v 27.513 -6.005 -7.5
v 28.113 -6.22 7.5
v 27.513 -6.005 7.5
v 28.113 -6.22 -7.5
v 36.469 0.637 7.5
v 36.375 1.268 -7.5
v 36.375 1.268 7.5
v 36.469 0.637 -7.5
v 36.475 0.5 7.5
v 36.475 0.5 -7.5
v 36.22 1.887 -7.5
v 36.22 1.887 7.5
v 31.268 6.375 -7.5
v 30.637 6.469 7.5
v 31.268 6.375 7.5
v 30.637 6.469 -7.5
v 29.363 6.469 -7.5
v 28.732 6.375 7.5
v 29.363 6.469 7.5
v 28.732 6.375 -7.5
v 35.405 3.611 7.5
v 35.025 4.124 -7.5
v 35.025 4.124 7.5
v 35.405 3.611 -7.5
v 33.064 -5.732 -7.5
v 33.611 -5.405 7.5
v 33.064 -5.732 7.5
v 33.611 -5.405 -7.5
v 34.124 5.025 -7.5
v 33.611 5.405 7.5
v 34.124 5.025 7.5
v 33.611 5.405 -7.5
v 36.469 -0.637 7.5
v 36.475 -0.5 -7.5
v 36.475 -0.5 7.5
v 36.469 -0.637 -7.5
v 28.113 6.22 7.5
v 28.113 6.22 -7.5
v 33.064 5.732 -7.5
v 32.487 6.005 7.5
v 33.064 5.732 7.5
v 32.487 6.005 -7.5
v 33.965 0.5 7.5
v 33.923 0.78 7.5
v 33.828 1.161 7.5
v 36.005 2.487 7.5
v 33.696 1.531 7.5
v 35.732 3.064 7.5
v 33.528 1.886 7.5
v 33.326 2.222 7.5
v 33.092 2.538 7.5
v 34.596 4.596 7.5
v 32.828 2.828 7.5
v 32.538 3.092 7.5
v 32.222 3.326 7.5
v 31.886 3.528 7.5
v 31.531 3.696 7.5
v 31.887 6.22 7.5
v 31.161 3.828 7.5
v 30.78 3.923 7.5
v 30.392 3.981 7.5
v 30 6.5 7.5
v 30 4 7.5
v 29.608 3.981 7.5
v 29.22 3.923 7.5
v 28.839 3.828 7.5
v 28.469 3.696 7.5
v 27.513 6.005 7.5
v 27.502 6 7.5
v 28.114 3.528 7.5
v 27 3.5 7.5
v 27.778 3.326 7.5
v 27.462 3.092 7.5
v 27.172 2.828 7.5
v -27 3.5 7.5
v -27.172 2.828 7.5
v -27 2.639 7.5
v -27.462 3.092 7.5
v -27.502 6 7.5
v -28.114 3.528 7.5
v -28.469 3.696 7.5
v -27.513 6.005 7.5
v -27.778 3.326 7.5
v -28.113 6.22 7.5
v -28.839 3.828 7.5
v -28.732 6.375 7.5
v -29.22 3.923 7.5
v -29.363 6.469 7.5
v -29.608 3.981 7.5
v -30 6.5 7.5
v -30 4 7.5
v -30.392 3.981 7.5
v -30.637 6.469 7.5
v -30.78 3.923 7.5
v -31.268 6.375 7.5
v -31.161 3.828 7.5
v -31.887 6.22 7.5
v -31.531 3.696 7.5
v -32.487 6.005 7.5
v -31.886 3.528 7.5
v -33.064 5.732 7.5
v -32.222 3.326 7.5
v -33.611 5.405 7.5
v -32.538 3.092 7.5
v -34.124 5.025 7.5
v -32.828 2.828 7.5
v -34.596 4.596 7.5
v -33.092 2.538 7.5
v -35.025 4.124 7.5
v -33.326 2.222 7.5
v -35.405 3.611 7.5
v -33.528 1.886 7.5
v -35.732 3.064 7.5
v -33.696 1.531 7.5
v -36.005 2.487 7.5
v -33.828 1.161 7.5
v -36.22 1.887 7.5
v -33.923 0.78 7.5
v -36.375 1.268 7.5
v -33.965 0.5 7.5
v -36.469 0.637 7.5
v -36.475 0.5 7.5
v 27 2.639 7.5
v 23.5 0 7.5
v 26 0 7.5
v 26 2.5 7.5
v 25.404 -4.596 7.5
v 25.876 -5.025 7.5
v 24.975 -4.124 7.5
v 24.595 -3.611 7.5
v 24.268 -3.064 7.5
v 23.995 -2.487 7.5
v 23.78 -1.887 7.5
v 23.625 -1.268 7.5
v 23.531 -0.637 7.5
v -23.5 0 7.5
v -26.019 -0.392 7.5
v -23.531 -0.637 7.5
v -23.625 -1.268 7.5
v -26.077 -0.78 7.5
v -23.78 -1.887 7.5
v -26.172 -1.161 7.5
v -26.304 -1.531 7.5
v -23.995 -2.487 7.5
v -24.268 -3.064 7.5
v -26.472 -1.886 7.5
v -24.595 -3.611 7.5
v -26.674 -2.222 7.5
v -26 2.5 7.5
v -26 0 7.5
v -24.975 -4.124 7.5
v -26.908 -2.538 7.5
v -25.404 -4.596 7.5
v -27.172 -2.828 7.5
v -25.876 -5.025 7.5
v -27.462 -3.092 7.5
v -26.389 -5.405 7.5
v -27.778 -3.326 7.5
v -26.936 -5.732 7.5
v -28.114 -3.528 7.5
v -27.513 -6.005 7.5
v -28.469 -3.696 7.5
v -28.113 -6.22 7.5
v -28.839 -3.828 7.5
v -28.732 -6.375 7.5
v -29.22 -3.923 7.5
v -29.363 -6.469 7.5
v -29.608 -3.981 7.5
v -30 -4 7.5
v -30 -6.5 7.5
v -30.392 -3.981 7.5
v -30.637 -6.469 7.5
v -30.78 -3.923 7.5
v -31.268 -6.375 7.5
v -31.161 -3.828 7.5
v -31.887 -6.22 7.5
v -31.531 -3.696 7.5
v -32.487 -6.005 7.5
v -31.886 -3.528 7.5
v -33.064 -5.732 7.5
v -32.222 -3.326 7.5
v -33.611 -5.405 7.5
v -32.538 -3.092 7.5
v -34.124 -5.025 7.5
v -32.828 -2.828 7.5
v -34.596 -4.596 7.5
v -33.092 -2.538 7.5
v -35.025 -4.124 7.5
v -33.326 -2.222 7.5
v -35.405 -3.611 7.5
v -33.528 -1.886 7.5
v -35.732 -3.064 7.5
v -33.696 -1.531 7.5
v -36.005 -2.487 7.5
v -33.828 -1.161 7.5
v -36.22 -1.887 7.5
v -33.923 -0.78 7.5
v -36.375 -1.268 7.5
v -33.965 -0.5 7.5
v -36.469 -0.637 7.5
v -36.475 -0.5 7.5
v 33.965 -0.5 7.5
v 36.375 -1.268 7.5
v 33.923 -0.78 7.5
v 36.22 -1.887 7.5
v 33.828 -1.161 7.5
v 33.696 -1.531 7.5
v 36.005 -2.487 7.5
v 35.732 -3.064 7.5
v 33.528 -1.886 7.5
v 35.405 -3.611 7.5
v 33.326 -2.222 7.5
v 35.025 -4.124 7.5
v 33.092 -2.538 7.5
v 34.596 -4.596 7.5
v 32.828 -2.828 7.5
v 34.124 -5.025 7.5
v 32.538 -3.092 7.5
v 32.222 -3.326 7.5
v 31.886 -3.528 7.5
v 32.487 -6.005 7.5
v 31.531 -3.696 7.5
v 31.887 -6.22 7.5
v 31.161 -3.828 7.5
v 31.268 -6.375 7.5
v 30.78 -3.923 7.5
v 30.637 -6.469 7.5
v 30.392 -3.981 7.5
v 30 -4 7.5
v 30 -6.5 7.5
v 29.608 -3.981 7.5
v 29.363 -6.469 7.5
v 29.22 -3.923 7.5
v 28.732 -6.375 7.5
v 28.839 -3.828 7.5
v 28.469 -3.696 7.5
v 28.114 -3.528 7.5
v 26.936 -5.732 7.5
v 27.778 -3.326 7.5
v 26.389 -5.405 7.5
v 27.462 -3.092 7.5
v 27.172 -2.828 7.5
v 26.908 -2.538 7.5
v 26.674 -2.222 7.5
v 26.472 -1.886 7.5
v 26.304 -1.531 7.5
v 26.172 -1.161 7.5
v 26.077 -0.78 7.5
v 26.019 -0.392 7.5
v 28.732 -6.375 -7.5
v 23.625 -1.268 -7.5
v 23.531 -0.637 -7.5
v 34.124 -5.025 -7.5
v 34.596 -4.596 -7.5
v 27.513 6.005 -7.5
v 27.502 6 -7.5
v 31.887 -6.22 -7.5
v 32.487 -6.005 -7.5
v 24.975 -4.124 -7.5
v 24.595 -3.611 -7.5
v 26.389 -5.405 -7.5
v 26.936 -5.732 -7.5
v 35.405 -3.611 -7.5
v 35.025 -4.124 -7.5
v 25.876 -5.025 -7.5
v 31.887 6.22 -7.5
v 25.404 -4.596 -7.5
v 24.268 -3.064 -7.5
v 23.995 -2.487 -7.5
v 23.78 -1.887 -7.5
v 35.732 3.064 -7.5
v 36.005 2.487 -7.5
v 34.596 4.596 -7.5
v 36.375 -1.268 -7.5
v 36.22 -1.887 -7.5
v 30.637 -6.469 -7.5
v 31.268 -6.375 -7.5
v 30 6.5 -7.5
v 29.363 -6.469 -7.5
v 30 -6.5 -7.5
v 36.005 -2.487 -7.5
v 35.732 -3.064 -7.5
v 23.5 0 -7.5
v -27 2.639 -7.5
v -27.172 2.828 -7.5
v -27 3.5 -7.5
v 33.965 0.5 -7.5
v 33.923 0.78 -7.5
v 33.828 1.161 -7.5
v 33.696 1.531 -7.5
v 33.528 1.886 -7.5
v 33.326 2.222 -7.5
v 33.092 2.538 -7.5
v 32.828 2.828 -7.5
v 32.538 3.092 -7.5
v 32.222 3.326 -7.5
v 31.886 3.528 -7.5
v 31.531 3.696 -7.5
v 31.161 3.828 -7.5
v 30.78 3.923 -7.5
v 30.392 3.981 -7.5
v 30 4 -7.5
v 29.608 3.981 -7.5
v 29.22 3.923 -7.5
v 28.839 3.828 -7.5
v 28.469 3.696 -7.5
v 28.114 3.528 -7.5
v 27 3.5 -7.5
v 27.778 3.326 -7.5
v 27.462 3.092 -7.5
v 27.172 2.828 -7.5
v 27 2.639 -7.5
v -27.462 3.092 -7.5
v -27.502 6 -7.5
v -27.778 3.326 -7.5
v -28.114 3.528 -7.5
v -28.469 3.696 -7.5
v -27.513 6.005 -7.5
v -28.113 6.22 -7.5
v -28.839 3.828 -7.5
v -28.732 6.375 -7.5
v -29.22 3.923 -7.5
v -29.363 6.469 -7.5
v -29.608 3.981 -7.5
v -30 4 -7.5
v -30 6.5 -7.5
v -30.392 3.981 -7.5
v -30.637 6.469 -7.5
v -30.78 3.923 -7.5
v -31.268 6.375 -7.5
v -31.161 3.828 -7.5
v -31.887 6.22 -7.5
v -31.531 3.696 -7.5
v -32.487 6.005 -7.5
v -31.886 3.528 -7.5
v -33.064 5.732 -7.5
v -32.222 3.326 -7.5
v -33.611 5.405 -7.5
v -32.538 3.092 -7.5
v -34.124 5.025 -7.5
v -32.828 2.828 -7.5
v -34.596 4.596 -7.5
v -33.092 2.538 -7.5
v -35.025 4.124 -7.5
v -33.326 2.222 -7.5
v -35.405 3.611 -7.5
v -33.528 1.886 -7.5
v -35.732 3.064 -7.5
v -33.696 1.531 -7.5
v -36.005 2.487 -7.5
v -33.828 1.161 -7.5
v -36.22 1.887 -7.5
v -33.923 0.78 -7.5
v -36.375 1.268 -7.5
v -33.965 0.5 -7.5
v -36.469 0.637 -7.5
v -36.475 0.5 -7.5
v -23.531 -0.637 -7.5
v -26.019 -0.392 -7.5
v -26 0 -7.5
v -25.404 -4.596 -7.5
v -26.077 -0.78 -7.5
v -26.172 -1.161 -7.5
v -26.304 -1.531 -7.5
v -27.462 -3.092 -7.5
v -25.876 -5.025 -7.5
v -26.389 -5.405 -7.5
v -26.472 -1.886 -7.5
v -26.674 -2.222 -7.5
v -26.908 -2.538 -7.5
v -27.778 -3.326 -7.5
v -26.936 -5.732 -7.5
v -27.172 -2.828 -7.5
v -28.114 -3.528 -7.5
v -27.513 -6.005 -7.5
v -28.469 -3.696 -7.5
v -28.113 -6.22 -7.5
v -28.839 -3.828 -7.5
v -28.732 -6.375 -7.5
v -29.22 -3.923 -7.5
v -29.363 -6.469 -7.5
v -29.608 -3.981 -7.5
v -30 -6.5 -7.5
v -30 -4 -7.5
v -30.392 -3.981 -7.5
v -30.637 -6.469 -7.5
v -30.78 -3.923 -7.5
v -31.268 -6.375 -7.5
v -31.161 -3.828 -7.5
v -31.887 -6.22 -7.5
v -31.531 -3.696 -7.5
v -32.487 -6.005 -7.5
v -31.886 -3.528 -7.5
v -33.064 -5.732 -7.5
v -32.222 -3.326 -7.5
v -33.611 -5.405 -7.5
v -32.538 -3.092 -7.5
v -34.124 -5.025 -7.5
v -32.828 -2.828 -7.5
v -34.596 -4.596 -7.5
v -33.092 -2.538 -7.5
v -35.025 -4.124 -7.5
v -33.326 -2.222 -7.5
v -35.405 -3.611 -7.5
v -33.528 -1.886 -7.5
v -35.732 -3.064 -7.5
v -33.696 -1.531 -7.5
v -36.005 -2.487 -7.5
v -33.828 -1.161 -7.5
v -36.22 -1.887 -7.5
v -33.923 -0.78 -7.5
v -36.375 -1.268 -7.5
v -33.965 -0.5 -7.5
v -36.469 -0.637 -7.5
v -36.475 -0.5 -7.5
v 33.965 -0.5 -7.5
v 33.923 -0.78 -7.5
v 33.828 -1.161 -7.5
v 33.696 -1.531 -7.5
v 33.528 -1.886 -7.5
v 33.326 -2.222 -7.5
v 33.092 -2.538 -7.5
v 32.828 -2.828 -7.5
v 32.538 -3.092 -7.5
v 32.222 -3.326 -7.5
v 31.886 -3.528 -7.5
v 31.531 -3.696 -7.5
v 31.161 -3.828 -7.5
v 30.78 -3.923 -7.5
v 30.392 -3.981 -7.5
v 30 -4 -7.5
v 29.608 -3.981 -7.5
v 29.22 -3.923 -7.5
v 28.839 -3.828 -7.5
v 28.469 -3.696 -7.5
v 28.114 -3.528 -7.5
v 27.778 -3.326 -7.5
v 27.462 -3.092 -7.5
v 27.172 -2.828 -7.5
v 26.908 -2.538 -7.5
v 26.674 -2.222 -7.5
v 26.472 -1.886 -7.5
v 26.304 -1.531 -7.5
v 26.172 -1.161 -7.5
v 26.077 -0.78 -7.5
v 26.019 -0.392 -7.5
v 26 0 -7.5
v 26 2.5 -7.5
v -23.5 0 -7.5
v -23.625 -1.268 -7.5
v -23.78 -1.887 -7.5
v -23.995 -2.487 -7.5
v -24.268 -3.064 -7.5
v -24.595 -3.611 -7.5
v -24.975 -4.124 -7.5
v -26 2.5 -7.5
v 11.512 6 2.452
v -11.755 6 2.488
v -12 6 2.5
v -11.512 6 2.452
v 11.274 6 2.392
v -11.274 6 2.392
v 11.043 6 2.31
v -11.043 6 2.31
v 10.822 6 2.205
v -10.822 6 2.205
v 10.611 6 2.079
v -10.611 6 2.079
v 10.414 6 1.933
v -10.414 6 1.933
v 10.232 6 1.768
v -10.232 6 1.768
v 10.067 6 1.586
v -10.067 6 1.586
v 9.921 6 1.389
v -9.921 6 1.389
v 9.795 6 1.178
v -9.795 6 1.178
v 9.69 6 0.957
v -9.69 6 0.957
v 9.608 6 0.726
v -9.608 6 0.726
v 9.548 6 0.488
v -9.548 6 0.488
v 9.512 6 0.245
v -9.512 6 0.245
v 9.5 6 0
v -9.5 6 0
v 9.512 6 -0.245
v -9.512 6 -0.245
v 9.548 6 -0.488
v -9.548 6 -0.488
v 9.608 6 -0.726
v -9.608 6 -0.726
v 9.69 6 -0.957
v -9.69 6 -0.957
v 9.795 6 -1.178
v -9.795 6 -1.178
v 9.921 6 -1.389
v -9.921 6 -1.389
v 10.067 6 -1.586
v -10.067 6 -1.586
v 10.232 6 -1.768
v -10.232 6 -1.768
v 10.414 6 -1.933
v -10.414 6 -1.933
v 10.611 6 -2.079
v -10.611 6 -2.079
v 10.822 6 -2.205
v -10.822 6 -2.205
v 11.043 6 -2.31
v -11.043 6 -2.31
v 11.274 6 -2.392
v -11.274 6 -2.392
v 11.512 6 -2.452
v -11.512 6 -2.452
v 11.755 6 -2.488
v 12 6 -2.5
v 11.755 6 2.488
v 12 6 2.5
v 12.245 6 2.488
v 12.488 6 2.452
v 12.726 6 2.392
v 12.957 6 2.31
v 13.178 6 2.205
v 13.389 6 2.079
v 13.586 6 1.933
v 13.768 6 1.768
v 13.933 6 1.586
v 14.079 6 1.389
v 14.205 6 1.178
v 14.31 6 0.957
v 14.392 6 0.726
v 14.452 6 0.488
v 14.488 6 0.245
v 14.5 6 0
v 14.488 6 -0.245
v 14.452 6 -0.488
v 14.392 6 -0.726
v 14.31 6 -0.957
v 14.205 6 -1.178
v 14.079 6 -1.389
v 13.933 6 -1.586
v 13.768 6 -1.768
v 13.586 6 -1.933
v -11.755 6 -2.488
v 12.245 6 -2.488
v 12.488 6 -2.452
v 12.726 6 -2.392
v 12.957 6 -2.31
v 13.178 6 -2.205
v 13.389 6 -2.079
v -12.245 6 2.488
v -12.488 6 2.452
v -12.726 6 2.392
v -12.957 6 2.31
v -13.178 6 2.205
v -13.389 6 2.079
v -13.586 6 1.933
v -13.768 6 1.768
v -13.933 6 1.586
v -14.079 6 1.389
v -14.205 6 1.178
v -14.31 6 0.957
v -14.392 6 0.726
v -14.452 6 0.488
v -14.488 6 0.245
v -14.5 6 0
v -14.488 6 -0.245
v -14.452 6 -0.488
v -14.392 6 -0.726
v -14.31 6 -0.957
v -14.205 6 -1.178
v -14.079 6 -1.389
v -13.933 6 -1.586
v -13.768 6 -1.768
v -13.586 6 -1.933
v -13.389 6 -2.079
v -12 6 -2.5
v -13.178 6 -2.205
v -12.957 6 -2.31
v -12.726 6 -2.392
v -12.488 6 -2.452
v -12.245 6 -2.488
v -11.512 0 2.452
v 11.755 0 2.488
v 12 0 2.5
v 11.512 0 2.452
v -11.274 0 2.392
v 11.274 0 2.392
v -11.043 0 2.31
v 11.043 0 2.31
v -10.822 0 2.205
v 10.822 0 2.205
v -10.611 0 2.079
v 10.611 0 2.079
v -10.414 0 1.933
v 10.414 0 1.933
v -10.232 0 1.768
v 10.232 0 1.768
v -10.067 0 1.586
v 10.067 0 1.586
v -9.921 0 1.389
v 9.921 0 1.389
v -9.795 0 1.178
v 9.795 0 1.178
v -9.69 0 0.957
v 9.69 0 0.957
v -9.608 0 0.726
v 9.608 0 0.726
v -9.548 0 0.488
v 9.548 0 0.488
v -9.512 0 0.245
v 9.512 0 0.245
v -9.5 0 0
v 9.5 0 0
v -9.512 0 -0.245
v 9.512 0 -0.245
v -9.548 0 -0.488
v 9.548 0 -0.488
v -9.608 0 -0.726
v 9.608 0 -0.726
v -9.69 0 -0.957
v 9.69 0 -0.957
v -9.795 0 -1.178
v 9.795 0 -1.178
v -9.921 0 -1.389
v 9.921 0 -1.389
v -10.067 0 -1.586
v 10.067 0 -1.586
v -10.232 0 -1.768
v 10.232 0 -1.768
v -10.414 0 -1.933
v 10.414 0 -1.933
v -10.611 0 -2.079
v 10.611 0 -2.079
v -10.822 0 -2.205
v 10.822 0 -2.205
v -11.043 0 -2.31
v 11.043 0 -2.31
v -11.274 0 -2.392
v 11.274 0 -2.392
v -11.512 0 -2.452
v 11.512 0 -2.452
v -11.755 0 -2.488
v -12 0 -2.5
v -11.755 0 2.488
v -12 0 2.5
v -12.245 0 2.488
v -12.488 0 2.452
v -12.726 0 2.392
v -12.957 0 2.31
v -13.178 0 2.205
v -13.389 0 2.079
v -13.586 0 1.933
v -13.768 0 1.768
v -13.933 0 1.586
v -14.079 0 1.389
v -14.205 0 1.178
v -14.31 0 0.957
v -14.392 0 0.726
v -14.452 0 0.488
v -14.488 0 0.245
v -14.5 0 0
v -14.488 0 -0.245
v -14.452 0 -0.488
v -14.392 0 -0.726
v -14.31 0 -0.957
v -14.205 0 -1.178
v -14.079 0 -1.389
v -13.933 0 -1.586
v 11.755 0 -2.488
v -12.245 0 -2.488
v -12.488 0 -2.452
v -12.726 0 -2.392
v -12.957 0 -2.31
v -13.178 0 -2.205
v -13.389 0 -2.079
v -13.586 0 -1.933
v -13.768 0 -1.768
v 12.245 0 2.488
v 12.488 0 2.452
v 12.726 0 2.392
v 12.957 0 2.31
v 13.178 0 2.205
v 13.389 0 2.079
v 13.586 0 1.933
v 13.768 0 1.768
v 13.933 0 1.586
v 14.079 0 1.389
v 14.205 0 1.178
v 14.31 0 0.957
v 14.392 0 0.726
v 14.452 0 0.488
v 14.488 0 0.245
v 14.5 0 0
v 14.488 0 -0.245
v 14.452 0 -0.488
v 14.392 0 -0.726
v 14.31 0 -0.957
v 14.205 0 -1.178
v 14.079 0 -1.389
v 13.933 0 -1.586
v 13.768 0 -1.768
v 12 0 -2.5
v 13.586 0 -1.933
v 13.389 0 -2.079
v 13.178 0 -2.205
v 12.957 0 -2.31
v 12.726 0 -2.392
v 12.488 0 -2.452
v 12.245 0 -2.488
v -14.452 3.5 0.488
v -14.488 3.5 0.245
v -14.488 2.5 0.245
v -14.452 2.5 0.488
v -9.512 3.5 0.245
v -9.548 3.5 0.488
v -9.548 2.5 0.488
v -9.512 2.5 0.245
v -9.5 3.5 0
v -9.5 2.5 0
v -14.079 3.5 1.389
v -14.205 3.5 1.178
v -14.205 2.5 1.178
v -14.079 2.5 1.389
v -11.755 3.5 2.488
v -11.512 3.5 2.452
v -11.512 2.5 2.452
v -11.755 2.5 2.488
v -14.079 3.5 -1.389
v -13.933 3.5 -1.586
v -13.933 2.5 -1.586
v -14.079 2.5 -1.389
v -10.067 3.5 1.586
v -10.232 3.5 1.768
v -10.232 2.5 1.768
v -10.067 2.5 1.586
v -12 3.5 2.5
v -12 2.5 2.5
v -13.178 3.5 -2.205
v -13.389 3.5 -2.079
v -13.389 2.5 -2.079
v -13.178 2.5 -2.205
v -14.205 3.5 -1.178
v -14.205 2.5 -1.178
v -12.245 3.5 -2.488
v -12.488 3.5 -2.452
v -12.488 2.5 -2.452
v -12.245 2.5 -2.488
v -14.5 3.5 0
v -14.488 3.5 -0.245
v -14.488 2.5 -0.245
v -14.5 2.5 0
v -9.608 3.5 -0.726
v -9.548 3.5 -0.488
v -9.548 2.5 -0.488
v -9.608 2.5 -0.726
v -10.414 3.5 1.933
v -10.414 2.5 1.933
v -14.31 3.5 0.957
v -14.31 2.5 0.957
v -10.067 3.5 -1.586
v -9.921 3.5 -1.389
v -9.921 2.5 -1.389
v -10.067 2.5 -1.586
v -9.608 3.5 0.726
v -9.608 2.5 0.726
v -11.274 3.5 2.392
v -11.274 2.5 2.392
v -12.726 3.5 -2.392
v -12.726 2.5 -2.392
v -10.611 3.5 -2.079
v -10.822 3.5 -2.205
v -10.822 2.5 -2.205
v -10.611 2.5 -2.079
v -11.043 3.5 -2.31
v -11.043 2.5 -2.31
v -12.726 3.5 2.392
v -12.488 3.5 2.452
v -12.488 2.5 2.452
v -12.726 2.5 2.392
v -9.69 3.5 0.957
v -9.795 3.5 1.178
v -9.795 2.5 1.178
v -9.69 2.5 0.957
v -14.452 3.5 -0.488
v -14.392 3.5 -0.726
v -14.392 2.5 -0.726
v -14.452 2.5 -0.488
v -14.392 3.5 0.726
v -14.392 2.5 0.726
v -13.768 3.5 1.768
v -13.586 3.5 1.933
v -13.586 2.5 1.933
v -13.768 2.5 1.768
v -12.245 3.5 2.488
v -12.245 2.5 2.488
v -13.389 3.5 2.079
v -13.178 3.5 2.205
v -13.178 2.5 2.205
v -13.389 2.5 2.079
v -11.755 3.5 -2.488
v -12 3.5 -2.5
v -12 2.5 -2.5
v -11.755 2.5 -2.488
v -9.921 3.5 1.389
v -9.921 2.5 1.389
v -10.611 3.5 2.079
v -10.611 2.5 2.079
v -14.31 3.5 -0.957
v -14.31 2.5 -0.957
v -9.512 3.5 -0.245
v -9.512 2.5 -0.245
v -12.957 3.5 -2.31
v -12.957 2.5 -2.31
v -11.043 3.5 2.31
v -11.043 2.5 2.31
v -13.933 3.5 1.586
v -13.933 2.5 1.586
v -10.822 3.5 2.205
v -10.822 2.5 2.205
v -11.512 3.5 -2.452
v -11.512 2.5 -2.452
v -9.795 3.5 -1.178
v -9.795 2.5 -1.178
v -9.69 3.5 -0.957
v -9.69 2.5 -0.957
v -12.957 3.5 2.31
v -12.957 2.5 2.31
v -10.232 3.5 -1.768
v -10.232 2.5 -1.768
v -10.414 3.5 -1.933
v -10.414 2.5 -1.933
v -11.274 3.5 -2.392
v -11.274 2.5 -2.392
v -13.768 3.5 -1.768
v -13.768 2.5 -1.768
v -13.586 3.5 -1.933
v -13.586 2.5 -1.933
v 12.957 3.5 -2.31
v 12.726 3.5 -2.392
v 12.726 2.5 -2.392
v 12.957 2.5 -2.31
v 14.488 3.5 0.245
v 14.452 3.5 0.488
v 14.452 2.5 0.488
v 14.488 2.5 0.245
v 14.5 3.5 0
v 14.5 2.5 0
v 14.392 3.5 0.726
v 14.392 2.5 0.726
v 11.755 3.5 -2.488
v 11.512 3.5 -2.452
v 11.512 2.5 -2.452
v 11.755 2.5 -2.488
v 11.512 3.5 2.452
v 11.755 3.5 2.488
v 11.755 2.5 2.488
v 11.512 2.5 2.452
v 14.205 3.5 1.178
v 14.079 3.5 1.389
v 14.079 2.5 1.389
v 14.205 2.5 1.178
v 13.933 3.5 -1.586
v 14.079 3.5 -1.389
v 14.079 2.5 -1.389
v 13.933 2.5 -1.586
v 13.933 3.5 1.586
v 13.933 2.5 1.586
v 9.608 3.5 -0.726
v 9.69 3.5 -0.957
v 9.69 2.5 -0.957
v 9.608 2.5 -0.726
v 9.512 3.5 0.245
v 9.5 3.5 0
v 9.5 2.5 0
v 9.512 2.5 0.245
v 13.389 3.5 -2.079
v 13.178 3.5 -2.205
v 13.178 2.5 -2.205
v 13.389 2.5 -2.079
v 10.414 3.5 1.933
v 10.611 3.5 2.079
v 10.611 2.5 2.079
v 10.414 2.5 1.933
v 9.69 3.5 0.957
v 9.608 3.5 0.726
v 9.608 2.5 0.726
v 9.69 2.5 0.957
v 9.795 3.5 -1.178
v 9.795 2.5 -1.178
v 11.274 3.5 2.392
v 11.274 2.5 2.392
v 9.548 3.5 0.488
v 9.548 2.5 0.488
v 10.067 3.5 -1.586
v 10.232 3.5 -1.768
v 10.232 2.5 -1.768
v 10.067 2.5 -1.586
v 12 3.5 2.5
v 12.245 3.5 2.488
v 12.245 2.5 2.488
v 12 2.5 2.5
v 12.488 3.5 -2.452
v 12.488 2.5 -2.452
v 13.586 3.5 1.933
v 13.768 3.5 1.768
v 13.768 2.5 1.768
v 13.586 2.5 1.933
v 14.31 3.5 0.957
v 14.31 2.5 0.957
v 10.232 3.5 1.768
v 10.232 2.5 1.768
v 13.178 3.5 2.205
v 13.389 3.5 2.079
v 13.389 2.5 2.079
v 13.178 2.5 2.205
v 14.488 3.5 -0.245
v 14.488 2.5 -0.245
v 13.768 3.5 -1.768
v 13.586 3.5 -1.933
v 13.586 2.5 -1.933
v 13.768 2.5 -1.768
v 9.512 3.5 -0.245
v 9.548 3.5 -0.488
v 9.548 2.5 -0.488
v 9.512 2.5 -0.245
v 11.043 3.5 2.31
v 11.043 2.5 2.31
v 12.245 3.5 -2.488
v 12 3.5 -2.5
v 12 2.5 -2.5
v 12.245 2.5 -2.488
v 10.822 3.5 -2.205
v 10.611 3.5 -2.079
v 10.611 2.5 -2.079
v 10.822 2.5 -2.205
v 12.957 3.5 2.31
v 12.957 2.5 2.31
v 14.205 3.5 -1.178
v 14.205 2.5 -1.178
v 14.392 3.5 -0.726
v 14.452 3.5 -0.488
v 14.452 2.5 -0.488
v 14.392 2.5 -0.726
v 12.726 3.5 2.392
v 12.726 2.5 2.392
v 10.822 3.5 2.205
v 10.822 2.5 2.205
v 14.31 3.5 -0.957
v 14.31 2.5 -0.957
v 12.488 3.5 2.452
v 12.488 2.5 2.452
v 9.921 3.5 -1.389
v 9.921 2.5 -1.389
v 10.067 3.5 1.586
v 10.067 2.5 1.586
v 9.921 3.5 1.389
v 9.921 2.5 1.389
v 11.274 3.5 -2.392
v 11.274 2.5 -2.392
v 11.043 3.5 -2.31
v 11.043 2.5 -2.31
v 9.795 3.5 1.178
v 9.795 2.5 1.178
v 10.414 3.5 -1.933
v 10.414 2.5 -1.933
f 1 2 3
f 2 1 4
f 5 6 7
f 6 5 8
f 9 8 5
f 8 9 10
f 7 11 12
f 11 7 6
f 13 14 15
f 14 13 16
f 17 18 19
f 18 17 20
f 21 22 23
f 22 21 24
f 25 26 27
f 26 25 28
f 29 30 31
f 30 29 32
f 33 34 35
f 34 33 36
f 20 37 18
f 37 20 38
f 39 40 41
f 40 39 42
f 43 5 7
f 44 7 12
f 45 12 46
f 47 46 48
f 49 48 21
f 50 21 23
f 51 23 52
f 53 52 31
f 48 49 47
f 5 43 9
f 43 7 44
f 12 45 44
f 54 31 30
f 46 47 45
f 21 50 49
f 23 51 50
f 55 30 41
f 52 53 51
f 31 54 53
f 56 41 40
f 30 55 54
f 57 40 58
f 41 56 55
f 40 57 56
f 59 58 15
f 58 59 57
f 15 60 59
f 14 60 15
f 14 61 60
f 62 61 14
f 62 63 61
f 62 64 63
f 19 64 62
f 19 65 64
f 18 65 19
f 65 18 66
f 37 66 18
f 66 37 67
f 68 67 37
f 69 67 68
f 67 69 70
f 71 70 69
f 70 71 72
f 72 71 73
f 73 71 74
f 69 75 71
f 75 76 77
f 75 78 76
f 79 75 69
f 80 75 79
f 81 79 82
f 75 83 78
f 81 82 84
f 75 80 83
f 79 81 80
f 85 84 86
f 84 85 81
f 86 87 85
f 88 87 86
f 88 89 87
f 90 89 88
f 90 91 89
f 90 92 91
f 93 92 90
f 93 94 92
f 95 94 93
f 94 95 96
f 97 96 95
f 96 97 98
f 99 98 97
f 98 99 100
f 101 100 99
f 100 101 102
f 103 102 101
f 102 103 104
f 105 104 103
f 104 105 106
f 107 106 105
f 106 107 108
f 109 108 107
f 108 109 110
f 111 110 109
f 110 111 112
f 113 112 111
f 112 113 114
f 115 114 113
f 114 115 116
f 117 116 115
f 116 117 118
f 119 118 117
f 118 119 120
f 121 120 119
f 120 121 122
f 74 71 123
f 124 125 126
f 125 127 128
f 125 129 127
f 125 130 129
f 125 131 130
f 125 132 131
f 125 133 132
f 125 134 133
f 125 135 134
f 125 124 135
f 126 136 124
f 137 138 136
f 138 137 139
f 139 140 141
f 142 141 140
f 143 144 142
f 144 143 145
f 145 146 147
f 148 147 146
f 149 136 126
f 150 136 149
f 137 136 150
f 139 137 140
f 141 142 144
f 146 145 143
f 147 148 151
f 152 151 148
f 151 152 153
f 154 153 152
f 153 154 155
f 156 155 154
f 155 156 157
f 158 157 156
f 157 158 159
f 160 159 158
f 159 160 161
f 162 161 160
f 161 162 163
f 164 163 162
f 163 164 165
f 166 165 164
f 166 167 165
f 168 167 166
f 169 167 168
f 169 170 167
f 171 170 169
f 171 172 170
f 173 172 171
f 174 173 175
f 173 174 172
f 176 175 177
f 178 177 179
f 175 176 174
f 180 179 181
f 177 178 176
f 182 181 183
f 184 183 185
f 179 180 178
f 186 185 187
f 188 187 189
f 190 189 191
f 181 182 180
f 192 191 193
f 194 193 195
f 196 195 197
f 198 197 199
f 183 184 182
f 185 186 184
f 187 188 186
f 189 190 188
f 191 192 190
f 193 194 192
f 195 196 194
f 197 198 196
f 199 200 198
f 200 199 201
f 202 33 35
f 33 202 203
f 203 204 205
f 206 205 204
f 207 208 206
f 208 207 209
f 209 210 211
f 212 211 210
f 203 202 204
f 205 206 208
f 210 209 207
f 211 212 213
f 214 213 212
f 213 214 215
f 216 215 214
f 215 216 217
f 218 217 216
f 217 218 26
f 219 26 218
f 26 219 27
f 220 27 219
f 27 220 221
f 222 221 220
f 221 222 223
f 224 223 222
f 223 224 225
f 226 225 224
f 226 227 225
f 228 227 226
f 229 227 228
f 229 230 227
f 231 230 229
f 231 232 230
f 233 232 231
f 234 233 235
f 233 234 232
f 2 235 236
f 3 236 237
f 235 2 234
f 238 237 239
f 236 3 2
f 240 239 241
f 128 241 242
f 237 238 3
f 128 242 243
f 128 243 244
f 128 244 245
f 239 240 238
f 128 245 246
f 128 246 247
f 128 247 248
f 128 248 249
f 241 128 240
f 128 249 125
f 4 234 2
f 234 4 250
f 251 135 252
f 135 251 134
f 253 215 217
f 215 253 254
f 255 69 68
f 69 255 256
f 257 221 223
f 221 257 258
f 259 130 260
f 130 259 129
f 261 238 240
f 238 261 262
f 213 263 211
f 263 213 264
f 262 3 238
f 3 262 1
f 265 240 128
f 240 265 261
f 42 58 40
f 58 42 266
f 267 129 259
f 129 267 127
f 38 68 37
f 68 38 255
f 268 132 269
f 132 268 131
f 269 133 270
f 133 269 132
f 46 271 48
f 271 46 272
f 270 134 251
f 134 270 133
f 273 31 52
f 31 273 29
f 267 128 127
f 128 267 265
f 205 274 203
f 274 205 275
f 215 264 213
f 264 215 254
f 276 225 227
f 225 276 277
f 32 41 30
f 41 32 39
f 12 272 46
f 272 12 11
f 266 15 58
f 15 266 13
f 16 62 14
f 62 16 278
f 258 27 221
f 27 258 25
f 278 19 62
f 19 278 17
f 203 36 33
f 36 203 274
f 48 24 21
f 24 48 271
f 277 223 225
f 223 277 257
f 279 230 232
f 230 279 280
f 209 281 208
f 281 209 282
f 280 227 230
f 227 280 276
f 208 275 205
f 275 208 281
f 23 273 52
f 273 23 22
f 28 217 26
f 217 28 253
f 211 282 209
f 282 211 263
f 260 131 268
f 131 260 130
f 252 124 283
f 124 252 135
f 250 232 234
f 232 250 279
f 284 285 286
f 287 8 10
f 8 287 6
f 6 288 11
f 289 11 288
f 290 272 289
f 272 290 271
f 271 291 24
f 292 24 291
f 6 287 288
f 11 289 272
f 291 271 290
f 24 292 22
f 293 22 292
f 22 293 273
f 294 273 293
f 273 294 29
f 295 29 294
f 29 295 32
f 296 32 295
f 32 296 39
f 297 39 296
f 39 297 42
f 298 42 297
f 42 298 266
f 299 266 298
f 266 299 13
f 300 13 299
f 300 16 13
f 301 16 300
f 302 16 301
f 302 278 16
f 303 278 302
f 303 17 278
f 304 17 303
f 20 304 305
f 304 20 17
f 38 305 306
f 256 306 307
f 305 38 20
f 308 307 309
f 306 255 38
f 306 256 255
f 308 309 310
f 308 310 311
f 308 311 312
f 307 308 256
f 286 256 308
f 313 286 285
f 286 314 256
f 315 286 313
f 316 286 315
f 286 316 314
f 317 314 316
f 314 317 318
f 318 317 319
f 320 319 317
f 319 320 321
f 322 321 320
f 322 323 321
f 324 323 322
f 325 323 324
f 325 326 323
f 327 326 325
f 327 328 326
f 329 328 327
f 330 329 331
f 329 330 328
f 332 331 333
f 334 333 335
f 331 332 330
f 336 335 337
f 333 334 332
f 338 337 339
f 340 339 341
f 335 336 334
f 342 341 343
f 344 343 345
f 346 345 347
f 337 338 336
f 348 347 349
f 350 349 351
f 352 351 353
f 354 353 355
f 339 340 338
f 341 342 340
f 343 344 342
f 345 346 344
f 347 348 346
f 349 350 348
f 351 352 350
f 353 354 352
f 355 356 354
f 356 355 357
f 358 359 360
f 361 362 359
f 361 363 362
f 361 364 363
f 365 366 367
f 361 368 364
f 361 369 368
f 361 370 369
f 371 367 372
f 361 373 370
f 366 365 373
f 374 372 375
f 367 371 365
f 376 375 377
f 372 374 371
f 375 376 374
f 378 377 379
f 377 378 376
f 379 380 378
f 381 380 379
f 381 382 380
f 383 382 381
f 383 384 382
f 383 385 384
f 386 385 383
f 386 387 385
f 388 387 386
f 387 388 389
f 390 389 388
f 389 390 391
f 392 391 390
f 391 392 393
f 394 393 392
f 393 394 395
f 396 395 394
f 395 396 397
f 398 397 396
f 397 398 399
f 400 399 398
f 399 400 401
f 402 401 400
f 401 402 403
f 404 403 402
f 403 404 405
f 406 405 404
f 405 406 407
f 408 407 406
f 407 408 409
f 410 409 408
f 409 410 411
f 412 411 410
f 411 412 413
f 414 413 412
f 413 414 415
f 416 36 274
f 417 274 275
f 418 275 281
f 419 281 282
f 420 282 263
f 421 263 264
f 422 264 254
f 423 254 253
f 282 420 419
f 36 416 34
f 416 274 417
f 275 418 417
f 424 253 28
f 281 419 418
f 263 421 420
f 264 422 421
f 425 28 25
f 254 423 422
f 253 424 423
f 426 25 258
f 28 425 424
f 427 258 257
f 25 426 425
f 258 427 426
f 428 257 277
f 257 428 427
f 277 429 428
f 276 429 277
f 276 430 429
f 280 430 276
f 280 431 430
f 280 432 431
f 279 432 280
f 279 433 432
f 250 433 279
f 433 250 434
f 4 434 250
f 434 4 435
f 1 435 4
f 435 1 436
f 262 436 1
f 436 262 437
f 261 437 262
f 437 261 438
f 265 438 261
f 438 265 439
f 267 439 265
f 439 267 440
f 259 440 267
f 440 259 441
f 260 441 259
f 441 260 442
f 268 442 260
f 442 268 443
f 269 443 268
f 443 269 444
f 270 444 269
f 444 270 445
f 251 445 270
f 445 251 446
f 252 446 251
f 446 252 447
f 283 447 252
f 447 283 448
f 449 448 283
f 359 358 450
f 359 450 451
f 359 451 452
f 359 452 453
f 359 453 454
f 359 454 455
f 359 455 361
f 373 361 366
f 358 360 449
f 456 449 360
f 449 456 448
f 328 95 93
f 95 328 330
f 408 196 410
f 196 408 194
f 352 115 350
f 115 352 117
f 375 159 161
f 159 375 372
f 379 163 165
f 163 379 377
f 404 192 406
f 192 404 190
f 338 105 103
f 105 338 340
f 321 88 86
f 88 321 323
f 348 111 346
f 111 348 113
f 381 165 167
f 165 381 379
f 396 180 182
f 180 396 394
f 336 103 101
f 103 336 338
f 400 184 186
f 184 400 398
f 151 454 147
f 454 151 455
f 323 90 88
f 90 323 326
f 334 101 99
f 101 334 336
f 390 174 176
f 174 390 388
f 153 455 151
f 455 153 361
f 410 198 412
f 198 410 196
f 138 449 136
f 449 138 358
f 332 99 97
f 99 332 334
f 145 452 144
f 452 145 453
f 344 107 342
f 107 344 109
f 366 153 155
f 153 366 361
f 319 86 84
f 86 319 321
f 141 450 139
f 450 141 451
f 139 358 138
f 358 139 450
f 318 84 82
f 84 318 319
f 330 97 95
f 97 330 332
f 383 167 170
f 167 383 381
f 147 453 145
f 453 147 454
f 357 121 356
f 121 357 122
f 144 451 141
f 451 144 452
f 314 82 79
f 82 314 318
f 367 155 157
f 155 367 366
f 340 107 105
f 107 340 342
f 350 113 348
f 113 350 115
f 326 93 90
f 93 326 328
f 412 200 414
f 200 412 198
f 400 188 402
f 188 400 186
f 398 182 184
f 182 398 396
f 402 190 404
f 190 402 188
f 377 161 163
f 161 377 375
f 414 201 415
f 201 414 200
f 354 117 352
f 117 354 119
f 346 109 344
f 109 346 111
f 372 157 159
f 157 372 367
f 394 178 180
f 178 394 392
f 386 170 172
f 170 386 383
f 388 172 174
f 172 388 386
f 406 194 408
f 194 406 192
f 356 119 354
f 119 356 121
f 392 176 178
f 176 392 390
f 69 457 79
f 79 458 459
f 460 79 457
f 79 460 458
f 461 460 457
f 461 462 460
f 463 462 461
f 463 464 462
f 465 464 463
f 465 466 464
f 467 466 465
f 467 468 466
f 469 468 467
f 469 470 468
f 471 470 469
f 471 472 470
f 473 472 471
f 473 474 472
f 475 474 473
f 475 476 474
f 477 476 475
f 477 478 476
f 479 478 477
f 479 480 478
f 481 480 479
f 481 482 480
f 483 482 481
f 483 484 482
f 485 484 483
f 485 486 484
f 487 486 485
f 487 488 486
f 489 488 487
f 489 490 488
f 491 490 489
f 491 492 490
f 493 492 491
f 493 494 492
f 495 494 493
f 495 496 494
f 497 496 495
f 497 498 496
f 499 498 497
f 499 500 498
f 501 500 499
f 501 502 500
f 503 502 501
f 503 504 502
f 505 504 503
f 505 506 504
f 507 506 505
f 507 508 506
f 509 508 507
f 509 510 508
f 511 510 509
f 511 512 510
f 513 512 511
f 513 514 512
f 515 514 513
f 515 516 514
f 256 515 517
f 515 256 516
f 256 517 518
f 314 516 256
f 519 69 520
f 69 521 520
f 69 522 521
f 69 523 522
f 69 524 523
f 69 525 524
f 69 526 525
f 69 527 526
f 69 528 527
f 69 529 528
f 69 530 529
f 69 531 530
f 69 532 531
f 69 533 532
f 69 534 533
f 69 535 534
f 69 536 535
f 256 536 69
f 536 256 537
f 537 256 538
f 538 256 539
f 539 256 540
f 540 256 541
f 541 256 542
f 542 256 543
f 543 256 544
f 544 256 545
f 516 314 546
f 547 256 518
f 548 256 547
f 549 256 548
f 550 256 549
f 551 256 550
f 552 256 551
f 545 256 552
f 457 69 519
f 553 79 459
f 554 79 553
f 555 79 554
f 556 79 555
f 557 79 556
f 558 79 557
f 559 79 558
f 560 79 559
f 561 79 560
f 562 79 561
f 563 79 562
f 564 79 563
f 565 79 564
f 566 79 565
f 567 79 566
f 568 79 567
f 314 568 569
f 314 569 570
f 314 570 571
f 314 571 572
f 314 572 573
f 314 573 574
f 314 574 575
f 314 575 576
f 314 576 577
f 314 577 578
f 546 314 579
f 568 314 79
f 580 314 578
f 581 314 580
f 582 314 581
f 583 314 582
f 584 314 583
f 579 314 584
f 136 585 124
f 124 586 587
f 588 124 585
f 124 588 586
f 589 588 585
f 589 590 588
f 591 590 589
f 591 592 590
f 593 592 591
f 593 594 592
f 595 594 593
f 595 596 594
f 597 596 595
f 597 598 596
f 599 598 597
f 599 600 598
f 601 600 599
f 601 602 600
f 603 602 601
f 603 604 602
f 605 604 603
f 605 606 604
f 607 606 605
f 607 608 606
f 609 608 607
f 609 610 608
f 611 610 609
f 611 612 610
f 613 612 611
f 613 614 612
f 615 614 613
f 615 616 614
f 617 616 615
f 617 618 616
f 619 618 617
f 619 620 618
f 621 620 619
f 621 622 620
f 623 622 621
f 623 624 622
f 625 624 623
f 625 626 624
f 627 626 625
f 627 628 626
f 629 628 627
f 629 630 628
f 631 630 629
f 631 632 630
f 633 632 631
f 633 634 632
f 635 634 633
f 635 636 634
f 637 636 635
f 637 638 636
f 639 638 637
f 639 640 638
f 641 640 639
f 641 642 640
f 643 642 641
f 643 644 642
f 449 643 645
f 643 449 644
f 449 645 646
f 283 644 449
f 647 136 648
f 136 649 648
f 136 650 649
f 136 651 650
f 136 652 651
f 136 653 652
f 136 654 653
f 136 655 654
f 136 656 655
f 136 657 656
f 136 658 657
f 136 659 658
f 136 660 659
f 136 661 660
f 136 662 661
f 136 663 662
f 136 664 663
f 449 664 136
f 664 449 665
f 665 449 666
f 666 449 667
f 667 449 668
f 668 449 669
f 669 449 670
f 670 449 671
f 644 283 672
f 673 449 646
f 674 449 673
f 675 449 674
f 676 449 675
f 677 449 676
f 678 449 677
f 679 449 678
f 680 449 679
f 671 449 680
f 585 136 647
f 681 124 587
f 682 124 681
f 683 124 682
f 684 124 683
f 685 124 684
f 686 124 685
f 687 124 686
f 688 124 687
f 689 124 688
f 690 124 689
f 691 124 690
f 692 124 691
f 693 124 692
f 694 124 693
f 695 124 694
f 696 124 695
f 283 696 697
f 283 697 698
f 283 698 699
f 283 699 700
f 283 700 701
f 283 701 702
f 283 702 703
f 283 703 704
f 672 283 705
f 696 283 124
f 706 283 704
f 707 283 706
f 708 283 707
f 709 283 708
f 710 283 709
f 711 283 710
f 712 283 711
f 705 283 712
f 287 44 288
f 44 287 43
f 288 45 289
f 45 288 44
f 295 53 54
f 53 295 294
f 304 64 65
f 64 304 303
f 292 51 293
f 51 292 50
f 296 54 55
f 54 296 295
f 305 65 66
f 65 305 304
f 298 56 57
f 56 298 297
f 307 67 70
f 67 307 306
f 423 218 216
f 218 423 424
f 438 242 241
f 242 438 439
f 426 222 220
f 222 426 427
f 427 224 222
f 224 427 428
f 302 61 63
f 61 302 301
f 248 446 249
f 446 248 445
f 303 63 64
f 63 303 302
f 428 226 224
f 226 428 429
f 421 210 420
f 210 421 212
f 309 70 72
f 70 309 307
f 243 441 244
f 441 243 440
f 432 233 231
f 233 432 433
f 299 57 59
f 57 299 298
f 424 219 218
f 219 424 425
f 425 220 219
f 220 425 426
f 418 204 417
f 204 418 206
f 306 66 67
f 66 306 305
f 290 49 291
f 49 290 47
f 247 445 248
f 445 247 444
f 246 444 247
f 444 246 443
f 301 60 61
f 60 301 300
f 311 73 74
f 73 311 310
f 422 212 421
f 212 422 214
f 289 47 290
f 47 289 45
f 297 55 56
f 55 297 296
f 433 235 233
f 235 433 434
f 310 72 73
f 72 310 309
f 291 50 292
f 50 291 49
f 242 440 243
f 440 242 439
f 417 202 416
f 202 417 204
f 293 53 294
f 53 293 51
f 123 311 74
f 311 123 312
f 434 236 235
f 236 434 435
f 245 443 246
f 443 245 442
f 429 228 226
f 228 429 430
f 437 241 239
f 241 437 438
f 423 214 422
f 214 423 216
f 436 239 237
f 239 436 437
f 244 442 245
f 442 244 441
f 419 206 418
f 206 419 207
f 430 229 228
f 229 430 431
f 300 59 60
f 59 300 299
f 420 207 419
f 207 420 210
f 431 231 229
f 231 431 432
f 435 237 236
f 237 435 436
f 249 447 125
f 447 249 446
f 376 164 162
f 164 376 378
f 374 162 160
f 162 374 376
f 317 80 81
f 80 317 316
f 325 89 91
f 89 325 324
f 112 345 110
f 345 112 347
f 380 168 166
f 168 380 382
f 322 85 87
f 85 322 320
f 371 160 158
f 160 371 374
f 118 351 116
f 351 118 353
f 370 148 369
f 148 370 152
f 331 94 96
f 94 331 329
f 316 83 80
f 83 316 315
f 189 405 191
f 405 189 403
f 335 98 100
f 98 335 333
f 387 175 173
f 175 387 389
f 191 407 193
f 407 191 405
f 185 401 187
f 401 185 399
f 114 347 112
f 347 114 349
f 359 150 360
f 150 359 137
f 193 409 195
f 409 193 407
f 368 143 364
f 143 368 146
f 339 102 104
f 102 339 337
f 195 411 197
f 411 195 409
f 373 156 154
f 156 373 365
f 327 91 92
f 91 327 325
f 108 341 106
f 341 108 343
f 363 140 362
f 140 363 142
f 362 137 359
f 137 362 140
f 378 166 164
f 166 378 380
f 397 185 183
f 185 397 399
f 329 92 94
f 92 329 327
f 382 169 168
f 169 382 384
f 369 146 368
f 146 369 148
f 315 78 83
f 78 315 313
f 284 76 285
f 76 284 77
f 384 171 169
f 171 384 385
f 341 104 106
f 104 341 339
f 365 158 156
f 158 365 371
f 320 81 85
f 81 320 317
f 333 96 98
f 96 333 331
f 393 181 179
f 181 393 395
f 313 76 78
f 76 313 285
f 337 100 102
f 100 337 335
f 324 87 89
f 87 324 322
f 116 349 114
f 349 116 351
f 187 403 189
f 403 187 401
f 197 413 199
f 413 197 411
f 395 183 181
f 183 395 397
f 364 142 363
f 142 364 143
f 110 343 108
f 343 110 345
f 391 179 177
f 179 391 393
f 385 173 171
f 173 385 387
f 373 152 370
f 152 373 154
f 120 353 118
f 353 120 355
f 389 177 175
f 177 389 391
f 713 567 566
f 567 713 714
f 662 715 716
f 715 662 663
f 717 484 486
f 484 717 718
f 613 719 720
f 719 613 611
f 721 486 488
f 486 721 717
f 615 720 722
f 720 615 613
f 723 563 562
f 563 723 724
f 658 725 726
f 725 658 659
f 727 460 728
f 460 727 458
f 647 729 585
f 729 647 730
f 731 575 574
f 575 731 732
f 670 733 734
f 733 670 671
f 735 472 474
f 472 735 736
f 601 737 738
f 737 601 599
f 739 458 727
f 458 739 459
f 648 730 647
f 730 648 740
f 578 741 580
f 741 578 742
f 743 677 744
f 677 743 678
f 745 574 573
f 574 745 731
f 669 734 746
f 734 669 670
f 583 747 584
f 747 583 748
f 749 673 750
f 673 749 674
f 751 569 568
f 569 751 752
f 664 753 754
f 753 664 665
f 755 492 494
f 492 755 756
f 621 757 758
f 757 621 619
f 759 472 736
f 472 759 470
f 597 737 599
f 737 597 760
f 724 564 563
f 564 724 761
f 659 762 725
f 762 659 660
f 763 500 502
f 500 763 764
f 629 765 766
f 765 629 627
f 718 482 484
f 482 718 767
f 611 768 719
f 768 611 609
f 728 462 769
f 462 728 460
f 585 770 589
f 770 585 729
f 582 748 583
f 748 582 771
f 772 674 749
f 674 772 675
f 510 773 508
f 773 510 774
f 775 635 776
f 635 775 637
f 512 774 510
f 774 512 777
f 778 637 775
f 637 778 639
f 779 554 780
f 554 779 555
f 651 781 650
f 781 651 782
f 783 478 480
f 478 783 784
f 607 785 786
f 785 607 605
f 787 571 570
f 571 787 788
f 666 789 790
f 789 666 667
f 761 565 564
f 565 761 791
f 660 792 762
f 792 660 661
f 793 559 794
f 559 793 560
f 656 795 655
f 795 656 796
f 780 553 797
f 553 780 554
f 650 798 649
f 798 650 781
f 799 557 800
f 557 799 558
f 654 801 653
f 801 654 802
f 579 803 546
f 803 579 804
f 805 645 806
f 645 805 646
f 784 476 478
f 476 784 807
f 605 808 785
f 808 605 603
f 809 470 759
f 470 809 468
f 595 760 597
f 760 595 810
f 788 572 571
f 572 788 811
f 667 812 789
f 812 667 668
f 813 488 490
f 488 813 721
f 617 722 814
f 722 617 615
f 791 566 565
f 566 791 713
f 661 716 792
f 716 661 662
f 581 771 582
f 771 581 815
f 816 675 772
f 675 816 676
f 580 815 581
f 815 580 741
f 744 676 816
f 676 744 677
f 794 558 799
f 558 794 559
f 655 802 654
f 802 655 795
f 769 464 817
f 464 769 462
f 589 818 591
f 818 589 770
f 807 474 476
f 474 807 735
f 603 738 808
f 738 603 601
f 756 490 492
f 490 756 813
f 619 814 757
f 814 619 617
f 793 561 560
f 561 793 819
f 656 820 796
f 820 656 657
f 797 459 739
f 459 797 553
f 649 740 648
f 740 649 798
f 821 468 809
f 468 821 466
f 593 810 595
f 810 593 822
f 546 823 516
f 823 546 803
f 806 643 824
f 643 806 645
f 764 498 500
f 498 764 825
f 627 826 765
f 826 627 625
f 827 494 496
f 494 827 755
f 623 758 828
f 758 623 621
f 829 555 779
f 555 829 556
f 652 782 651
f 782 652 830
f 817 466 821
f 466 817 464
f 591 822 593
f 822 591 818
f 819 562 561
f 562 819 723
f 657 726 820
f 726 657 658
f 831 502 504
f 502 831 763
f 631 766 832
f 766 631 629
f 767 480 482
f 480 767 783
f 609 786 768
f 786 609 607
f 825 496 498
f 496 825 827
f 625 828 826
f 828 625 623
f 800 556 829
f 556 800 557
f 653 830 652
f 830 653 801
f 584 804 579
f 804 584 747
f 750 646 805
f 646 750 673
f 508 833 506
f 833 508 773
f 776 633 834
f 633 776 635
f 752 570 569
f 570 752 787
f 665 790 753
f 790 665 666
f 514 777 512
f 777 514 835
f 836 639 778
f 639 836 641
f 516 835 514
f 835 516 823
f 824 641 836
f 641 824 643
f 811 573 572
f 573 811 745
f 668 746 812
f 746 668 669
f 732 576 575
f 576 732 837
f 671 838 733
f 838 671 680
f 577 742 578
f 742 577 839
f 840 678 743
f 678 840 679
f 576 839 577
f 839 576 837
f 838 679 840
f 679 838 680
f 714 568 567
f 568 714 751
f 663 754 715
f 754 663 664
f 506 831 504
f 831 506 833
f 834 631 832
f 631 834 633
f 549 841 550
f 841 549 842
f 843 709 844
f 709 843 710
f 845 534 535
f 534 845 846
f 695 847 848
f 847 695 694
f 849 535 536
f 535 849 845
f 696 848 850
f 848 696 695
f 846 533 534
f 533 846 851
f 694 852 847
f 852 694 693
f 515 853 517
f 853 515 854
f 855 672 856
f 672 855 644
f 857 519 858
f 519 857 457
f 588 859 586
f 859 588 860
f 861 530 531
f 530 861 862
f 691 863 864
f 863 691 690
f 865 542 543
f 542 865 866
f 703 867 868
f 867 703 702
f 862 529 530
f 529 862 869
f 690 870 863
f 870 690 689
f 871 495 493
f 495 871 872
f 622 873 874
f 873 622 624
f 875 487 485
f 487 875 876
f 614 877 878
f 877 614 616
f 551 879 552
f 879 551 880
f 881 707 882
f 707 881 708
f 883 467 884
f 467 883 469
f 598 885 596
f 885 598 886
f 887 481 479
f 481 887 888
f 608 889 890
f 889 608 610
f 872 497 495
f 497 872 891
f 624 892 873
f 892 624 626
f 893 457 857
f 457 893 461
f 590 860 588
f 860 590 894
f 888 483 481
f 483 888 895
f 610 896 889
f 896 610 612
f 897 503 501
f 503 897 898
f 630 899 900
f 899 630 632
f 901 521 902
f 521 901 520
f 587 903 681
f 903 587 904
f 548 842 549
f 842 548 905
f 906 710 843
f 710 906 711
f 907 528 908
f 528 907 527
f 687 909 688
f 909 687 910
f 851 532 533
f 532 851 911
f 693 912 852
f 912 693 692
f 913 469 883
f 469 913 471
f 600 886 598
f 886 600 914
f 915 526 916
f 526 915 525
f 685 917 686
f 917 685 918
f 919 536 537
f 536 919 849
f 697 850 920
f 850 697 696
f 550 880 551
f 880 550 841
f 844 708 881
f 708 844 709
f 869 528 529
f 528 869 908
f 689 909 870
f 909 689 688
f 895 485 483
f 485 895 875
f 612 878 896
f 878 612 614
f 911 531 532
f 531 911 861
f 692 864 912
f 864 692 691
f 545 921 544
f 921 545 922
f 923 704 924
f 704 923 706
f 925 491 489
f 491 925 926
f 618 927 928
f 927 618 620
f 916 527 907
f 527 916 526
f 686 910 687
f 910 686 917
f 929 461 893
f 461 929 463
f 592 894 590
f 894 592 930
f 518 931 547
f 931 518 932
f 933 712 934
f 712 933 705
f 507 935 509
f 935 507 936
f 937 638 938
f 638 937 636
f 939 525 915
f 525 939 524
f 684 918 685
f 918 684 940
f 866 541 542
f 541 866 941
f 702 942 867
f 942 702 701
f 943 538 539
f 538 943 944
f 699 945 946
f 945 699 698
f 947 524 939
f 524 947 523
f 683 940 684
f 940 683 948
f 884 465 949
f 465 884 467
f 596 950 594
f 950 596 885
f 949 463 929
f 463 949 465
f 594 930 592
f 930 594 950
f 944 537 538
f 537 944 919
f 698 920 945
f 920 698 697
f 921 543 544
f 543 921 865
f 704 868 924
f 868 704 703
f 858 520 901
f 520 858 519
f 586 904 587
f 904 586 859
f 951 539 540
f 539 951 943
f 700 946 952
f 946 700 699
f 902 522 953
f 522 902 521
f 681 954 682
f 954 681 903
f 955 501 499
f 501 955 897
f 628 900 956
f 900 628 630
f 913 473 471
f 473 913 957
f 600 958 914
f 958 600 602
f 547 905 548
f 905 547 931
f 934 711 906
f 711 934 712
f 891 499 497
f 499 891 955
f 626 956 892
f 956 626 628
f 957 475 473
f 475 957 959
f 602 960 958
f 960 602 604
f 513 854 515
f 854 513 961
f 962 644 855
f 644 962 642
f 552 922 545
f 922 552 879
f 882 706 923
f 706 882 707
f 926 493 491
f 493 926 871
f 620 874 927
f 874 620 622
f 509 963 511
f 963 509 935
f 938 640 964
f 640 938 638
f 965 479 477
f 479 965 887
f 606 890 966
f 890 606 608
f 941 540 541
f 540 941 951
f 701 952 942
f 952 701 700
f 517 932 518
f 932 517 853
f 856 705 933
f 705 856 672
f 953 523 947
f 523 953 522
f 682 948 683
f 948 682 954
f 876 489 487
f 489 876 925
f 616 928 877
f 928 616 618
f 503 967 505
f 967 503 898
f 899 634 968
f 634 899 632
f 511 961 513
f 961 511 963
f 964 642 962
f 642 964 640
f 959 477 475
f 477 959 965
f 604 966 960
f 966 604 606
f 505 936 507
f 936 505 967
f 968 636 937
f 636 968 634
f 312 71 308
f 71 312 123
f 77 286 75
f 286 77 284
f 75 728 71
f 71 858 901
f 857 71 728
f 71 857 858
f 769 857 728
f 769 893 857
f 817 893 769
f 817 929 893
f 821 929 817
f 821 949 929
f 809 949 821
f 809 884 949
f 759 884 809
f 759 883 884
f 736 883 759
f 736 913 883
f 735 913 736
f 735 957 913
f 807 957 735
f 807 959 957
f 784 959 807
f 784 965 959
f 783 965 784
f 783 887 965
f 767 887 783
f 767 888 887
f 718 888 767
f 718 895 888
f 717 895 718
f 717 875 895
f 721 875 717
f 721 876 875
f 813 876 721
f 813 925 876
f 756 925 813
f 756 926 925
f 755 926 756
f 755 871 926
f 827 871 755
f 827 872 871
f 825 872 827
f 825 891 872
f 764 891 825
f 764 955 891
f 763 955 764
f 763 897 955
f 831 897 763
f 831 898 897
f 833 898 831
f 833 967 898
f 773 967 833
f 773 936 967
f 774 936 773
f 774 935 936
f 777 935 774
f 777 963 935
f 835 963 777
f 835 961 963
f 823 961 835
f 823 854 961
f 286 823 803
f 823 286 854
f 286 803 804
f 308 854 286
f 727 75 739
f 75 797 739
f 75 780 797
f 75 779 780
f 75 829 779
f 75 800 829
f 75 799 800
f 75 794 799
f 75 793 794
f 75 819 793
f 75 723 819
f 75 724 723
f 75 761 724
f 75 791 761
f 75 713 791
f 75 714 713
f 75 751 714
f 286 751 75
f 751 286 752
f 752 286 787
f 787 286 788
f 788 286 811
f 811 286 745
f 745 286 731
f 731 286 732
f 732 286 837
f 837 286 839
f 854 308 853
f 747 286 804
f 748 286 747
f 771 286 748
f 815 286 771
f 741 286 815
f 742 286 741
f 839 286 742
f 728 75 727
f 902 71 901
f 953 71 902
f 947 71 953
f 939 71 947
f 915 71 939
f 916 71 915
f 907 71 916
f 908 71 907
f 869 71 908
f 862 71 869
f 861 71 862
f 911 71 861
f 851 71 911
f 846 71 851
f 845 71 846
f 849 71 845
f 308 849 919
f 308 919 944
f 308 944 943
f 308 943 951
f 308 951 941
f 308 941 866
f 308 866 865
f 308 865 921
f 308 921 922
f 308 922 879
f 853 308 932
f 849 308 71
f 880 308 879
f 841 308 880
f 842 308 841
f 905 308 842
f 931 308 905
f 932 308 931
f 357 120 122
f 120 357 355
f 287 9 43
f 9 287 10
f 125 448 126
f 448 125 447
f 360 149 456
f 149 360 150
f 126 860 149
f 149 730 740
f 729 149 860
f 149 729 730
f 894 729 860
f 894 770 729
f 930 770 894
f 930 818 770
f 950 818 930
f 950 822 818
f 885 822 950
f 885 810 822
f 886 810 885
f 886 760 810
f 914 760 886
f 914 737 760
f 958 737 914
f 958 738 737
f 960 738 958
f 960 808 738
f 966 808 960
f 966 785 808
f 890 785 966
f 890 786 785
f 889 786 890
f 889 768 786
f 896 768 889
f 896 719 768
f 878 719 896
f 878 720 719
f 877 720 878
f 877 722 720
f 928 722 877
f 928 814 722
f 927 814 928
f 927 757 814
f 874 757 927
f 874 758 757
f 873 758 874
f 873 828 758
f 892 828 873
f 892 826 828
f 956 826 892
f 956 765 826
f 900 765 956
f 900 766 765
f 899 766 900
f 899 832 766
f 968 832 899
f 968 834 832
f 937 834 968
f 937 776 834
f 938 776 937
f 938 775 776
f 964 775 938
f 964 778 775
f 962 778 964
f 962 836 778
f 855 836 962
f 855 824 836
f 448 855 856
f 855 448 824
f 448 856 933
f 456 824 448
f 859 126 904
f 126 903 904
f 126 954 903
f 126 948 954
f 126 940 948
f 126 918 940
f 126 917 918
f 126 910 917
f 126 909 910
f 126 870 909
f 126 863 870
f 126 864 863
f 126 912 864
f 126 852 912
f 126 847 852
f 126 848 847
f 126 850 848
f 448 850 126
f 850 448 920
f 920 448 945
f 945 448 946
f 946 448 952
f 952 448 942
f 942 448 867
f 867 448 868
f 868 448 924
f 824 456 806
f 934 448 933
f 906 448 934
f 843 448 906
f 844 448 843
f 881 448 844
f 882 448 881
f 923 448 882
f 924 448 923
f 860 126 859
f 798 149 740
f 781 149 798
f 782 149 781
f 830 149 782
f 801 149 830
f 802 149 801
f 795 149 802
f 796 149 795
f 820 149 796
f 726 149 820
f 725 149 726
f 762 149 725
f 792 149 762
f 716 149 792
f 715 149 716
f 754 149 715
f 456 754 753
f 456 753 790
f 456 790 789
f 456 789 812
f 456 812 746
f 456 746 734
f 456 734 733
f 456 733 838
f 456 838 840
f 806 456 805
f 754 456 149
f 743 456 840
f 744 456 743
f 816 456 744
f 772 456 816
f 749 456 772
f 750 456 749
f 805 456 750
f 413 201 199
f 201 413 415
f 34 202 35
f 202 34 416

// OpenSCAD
part = "all"; // [bigger,smaller,all]
rod_diameter=8;
rods_distance=60;
offset=3;
mount_hole=5;
mount_hole_distance=24;
part_width=15;
part_thickness=2.5;
air_gap=1;
$fn=64;
module whole(){
    translate([rods_distance/2,0,0])cylinder(d=rod_diameter+2*part_thickness, h=part_width, center=true);
             translate([-rods_distance/2,0,0])cylinder(d=rod_diameter+2*part_thickness, h=part_width, center=true);
     translate([0,offset,0])cube([rods_distance-rod_diameter+2*part_thickness+2*air_gap,2*part_thickness+air_gap,part_width],center=true);
       translate([rods_distance/2-rod_diameter/2+air_gap/2,(offset-part_thickness-air_gap/2)/2,0])cube([2*part_thickness+air_gap,offset-part_thickness-air_gap/2,part_width],center=true);
       translate([-rods_distance/2+rod_diameter/2-air_gap/2,(offset-part_thickness-air_gap/2)/2,0])cube([2*part_thickness+air_gap,offset-part_thickness-air_gap/2,part_width],center=true);
    }
module holes(){
    translate([rods_distance/2,0,0])cylinder(d=rod_diameter,h=part_width+2,center=true);
    translate([-rods_distance/2,0,0])cylinder(d=rod_diameter,h=part_width+2,center=true);
    translate([-mount_hole_distance/2,offset,0])rotate([90,0,0])cylinder(d=mount_hole, h=2*part_thickness+air_gap+2, center=true);         
             translate([mount_hole_distance/2,offset,0])rotate([90,0,0])cylinder(d=mount_hole, h=2*part_thickness+air_gap+2, center=true);
    }
module bigger() {
    difference(){
        whole();
        holes();
        cutter(air_gap);
        }
}
module smaller() {
    intersection(){
    difference(){
        whole();
        holes();
        }
        cutter(0);
    }
}
module cutter(gap){
    translate([(rod_diameter-rods_distance)/2-gap,-rod_diameter/2-part_thickness,-part_width/2-1])cube([rods_distance-rod_diameter+2*gap,part_thickness+rod_diameter/2+offset-air_gap/2+gap,part_width+2]);
    translate([-(rods_distance+rod_diameter+2*part_thickness)/2-1,-rod_diameter/2-part_thickness,-part_width/2-1])cube([rods_distance+rod_diameter+2*part_thickness+2,part_thickness+rod_diameter/2-air_gap/2+gap,part_width+2]);
    translate([rods_distance/2-rod_diameter/2,-rod_diameter/2-max(0,air_gap/2-offset),-(part_width+2)/2])cube([rod_diameter/2,rod_diameter/2,part_width+2]);
    translate([-rods_distance/2,-rod_diameter/2-max(0,air_gap/2-offset),-(part_width+2)/2])cube([rod_diameter/2,rod_diameter/2,part_width+2]);
}
module divider(gap)
{
    translate([0,offset-part_thickness-gap/2,0])cube([rods_distance-rod_diameter,2*part_thickness+air_gap,part_width],center=true);
    cube([rods_distance-rod_diameter,2*offset,part_width],center=true);
    
    /*
    cube([rods_distance-rod_diameter+air_gap-gap,(2*offset-gap),part_width+2],center=true);
    translate([0,(-rod_diameter/2-part_thickness-1-gap)/2,0])cube([rods_distance,rod_diameter/2+part_thickness+1,part_width+2],center=true);
    translate([0,-rod_diameter/2-part_thickness-gap/2,0])cube([rods_distance+rod_diameter+2*part_thickness+1,rod_diameter+2*part_thickness,part_width+2],center=true);
    */
    }
if (part=="test") {
    difference(){whole();holes();}
}
if (part=="bigger") {
bigger();
}
if (part=="smaller") {
    smaller();
}
if (part=="all")
{
    bigger();
    smaller();
    }
